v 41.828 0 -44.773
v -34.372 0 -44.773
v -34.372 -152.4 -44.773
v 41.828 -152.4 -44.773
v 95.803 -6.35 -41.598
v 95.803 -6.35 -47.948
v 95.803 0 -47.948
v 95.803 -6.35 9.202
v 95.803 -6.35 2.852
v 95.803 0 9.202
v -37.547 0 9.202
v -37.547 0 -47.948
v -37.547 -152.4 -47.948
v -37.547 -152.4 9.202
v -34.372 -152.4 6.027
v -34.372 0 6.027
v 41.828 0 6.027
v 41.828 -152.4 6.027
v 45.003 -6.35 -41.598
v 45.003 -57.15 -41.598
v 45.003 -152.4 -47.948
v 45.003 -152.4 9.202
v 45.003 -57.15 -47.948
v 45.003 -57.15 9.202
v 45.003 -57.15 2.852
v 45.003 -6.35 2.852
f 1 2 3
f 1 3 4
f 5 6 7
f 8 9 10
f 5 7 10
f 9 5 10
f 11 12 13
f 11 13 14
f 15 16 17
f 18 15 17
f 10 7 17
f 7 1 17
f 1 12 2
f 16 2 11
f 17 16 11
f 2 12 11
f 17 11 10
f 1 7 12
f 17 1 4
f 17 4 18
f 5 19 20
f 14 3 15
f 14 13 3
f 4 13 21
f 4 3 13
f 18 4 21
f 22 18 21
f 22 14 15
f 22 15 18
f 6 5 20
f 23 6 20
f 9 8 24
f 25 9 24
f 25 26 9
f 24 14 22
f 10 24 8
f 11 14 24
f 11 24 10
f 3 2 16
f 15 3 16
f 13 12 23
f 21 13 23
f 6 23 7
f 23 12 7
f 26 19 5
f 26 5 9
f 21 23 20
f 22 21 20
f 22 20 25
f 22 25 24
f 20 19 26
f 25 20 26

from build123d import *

# Parameters (mm, degrees)
F0_W     = 82.55
F0_H     = 57.15
F0_W_2   = 76.2
F0_H_2   = 50.8
F1_DEPTH = 152.4
F2_W     = 6.35
F2_H     = 57.15
F3_DEPTH = 50.8
F4_W     = 50.8
F4_H     = 6.35
F5_DEPTH = 50.8
F7_DEPTH = 118.618


with BuildPart() as f1:
    # F0 (on Front) → F1 (new body)
    with BuildSketch(Plane.XZ):
        with Locations((3.728271, -19.37303)):
            Rectangle(F0_W, F0_H)
        with Locations((3.728271, -19.37303)):
            Rectangle(F0_W_2, F0_H_2, mode=Mode.SUBTRACT)
    extrude(amount=F1_DEPTH)

    # F2 (on face) → F3 (join)
    with BuildSketch(Plane.YZ.offset(45.003271)):
        with Locations((-3.175, -19.37303)):
            Rectangle(F2_W, F2_H)
    extrude(amount=F3_DEPTH)

    # F4 (on face) → F5 (join)
    with BuildSketch(Plane.XZ.offset(6.35)):
        with Locations((70.403271, -44.77303)):
            Rectangle(F4_W, F4_H)
        with Locations((70.403271, 6.02697)):
            Rectangle(F4_W, F4_H)
    extrude(amount=F5_DEPTH)

    # F6 (on face) → F7 (cut)
    with BuildSketch(Plane.XY.offset(9.20197)):
        Polygon((95.803271, -6.35), (45.003271, -57.15), (95.803271, -57.15), align=None)
    extrude(amount=-F7_DEPTH, mode=Mode.SUBTRACT)


solid = f1.part
